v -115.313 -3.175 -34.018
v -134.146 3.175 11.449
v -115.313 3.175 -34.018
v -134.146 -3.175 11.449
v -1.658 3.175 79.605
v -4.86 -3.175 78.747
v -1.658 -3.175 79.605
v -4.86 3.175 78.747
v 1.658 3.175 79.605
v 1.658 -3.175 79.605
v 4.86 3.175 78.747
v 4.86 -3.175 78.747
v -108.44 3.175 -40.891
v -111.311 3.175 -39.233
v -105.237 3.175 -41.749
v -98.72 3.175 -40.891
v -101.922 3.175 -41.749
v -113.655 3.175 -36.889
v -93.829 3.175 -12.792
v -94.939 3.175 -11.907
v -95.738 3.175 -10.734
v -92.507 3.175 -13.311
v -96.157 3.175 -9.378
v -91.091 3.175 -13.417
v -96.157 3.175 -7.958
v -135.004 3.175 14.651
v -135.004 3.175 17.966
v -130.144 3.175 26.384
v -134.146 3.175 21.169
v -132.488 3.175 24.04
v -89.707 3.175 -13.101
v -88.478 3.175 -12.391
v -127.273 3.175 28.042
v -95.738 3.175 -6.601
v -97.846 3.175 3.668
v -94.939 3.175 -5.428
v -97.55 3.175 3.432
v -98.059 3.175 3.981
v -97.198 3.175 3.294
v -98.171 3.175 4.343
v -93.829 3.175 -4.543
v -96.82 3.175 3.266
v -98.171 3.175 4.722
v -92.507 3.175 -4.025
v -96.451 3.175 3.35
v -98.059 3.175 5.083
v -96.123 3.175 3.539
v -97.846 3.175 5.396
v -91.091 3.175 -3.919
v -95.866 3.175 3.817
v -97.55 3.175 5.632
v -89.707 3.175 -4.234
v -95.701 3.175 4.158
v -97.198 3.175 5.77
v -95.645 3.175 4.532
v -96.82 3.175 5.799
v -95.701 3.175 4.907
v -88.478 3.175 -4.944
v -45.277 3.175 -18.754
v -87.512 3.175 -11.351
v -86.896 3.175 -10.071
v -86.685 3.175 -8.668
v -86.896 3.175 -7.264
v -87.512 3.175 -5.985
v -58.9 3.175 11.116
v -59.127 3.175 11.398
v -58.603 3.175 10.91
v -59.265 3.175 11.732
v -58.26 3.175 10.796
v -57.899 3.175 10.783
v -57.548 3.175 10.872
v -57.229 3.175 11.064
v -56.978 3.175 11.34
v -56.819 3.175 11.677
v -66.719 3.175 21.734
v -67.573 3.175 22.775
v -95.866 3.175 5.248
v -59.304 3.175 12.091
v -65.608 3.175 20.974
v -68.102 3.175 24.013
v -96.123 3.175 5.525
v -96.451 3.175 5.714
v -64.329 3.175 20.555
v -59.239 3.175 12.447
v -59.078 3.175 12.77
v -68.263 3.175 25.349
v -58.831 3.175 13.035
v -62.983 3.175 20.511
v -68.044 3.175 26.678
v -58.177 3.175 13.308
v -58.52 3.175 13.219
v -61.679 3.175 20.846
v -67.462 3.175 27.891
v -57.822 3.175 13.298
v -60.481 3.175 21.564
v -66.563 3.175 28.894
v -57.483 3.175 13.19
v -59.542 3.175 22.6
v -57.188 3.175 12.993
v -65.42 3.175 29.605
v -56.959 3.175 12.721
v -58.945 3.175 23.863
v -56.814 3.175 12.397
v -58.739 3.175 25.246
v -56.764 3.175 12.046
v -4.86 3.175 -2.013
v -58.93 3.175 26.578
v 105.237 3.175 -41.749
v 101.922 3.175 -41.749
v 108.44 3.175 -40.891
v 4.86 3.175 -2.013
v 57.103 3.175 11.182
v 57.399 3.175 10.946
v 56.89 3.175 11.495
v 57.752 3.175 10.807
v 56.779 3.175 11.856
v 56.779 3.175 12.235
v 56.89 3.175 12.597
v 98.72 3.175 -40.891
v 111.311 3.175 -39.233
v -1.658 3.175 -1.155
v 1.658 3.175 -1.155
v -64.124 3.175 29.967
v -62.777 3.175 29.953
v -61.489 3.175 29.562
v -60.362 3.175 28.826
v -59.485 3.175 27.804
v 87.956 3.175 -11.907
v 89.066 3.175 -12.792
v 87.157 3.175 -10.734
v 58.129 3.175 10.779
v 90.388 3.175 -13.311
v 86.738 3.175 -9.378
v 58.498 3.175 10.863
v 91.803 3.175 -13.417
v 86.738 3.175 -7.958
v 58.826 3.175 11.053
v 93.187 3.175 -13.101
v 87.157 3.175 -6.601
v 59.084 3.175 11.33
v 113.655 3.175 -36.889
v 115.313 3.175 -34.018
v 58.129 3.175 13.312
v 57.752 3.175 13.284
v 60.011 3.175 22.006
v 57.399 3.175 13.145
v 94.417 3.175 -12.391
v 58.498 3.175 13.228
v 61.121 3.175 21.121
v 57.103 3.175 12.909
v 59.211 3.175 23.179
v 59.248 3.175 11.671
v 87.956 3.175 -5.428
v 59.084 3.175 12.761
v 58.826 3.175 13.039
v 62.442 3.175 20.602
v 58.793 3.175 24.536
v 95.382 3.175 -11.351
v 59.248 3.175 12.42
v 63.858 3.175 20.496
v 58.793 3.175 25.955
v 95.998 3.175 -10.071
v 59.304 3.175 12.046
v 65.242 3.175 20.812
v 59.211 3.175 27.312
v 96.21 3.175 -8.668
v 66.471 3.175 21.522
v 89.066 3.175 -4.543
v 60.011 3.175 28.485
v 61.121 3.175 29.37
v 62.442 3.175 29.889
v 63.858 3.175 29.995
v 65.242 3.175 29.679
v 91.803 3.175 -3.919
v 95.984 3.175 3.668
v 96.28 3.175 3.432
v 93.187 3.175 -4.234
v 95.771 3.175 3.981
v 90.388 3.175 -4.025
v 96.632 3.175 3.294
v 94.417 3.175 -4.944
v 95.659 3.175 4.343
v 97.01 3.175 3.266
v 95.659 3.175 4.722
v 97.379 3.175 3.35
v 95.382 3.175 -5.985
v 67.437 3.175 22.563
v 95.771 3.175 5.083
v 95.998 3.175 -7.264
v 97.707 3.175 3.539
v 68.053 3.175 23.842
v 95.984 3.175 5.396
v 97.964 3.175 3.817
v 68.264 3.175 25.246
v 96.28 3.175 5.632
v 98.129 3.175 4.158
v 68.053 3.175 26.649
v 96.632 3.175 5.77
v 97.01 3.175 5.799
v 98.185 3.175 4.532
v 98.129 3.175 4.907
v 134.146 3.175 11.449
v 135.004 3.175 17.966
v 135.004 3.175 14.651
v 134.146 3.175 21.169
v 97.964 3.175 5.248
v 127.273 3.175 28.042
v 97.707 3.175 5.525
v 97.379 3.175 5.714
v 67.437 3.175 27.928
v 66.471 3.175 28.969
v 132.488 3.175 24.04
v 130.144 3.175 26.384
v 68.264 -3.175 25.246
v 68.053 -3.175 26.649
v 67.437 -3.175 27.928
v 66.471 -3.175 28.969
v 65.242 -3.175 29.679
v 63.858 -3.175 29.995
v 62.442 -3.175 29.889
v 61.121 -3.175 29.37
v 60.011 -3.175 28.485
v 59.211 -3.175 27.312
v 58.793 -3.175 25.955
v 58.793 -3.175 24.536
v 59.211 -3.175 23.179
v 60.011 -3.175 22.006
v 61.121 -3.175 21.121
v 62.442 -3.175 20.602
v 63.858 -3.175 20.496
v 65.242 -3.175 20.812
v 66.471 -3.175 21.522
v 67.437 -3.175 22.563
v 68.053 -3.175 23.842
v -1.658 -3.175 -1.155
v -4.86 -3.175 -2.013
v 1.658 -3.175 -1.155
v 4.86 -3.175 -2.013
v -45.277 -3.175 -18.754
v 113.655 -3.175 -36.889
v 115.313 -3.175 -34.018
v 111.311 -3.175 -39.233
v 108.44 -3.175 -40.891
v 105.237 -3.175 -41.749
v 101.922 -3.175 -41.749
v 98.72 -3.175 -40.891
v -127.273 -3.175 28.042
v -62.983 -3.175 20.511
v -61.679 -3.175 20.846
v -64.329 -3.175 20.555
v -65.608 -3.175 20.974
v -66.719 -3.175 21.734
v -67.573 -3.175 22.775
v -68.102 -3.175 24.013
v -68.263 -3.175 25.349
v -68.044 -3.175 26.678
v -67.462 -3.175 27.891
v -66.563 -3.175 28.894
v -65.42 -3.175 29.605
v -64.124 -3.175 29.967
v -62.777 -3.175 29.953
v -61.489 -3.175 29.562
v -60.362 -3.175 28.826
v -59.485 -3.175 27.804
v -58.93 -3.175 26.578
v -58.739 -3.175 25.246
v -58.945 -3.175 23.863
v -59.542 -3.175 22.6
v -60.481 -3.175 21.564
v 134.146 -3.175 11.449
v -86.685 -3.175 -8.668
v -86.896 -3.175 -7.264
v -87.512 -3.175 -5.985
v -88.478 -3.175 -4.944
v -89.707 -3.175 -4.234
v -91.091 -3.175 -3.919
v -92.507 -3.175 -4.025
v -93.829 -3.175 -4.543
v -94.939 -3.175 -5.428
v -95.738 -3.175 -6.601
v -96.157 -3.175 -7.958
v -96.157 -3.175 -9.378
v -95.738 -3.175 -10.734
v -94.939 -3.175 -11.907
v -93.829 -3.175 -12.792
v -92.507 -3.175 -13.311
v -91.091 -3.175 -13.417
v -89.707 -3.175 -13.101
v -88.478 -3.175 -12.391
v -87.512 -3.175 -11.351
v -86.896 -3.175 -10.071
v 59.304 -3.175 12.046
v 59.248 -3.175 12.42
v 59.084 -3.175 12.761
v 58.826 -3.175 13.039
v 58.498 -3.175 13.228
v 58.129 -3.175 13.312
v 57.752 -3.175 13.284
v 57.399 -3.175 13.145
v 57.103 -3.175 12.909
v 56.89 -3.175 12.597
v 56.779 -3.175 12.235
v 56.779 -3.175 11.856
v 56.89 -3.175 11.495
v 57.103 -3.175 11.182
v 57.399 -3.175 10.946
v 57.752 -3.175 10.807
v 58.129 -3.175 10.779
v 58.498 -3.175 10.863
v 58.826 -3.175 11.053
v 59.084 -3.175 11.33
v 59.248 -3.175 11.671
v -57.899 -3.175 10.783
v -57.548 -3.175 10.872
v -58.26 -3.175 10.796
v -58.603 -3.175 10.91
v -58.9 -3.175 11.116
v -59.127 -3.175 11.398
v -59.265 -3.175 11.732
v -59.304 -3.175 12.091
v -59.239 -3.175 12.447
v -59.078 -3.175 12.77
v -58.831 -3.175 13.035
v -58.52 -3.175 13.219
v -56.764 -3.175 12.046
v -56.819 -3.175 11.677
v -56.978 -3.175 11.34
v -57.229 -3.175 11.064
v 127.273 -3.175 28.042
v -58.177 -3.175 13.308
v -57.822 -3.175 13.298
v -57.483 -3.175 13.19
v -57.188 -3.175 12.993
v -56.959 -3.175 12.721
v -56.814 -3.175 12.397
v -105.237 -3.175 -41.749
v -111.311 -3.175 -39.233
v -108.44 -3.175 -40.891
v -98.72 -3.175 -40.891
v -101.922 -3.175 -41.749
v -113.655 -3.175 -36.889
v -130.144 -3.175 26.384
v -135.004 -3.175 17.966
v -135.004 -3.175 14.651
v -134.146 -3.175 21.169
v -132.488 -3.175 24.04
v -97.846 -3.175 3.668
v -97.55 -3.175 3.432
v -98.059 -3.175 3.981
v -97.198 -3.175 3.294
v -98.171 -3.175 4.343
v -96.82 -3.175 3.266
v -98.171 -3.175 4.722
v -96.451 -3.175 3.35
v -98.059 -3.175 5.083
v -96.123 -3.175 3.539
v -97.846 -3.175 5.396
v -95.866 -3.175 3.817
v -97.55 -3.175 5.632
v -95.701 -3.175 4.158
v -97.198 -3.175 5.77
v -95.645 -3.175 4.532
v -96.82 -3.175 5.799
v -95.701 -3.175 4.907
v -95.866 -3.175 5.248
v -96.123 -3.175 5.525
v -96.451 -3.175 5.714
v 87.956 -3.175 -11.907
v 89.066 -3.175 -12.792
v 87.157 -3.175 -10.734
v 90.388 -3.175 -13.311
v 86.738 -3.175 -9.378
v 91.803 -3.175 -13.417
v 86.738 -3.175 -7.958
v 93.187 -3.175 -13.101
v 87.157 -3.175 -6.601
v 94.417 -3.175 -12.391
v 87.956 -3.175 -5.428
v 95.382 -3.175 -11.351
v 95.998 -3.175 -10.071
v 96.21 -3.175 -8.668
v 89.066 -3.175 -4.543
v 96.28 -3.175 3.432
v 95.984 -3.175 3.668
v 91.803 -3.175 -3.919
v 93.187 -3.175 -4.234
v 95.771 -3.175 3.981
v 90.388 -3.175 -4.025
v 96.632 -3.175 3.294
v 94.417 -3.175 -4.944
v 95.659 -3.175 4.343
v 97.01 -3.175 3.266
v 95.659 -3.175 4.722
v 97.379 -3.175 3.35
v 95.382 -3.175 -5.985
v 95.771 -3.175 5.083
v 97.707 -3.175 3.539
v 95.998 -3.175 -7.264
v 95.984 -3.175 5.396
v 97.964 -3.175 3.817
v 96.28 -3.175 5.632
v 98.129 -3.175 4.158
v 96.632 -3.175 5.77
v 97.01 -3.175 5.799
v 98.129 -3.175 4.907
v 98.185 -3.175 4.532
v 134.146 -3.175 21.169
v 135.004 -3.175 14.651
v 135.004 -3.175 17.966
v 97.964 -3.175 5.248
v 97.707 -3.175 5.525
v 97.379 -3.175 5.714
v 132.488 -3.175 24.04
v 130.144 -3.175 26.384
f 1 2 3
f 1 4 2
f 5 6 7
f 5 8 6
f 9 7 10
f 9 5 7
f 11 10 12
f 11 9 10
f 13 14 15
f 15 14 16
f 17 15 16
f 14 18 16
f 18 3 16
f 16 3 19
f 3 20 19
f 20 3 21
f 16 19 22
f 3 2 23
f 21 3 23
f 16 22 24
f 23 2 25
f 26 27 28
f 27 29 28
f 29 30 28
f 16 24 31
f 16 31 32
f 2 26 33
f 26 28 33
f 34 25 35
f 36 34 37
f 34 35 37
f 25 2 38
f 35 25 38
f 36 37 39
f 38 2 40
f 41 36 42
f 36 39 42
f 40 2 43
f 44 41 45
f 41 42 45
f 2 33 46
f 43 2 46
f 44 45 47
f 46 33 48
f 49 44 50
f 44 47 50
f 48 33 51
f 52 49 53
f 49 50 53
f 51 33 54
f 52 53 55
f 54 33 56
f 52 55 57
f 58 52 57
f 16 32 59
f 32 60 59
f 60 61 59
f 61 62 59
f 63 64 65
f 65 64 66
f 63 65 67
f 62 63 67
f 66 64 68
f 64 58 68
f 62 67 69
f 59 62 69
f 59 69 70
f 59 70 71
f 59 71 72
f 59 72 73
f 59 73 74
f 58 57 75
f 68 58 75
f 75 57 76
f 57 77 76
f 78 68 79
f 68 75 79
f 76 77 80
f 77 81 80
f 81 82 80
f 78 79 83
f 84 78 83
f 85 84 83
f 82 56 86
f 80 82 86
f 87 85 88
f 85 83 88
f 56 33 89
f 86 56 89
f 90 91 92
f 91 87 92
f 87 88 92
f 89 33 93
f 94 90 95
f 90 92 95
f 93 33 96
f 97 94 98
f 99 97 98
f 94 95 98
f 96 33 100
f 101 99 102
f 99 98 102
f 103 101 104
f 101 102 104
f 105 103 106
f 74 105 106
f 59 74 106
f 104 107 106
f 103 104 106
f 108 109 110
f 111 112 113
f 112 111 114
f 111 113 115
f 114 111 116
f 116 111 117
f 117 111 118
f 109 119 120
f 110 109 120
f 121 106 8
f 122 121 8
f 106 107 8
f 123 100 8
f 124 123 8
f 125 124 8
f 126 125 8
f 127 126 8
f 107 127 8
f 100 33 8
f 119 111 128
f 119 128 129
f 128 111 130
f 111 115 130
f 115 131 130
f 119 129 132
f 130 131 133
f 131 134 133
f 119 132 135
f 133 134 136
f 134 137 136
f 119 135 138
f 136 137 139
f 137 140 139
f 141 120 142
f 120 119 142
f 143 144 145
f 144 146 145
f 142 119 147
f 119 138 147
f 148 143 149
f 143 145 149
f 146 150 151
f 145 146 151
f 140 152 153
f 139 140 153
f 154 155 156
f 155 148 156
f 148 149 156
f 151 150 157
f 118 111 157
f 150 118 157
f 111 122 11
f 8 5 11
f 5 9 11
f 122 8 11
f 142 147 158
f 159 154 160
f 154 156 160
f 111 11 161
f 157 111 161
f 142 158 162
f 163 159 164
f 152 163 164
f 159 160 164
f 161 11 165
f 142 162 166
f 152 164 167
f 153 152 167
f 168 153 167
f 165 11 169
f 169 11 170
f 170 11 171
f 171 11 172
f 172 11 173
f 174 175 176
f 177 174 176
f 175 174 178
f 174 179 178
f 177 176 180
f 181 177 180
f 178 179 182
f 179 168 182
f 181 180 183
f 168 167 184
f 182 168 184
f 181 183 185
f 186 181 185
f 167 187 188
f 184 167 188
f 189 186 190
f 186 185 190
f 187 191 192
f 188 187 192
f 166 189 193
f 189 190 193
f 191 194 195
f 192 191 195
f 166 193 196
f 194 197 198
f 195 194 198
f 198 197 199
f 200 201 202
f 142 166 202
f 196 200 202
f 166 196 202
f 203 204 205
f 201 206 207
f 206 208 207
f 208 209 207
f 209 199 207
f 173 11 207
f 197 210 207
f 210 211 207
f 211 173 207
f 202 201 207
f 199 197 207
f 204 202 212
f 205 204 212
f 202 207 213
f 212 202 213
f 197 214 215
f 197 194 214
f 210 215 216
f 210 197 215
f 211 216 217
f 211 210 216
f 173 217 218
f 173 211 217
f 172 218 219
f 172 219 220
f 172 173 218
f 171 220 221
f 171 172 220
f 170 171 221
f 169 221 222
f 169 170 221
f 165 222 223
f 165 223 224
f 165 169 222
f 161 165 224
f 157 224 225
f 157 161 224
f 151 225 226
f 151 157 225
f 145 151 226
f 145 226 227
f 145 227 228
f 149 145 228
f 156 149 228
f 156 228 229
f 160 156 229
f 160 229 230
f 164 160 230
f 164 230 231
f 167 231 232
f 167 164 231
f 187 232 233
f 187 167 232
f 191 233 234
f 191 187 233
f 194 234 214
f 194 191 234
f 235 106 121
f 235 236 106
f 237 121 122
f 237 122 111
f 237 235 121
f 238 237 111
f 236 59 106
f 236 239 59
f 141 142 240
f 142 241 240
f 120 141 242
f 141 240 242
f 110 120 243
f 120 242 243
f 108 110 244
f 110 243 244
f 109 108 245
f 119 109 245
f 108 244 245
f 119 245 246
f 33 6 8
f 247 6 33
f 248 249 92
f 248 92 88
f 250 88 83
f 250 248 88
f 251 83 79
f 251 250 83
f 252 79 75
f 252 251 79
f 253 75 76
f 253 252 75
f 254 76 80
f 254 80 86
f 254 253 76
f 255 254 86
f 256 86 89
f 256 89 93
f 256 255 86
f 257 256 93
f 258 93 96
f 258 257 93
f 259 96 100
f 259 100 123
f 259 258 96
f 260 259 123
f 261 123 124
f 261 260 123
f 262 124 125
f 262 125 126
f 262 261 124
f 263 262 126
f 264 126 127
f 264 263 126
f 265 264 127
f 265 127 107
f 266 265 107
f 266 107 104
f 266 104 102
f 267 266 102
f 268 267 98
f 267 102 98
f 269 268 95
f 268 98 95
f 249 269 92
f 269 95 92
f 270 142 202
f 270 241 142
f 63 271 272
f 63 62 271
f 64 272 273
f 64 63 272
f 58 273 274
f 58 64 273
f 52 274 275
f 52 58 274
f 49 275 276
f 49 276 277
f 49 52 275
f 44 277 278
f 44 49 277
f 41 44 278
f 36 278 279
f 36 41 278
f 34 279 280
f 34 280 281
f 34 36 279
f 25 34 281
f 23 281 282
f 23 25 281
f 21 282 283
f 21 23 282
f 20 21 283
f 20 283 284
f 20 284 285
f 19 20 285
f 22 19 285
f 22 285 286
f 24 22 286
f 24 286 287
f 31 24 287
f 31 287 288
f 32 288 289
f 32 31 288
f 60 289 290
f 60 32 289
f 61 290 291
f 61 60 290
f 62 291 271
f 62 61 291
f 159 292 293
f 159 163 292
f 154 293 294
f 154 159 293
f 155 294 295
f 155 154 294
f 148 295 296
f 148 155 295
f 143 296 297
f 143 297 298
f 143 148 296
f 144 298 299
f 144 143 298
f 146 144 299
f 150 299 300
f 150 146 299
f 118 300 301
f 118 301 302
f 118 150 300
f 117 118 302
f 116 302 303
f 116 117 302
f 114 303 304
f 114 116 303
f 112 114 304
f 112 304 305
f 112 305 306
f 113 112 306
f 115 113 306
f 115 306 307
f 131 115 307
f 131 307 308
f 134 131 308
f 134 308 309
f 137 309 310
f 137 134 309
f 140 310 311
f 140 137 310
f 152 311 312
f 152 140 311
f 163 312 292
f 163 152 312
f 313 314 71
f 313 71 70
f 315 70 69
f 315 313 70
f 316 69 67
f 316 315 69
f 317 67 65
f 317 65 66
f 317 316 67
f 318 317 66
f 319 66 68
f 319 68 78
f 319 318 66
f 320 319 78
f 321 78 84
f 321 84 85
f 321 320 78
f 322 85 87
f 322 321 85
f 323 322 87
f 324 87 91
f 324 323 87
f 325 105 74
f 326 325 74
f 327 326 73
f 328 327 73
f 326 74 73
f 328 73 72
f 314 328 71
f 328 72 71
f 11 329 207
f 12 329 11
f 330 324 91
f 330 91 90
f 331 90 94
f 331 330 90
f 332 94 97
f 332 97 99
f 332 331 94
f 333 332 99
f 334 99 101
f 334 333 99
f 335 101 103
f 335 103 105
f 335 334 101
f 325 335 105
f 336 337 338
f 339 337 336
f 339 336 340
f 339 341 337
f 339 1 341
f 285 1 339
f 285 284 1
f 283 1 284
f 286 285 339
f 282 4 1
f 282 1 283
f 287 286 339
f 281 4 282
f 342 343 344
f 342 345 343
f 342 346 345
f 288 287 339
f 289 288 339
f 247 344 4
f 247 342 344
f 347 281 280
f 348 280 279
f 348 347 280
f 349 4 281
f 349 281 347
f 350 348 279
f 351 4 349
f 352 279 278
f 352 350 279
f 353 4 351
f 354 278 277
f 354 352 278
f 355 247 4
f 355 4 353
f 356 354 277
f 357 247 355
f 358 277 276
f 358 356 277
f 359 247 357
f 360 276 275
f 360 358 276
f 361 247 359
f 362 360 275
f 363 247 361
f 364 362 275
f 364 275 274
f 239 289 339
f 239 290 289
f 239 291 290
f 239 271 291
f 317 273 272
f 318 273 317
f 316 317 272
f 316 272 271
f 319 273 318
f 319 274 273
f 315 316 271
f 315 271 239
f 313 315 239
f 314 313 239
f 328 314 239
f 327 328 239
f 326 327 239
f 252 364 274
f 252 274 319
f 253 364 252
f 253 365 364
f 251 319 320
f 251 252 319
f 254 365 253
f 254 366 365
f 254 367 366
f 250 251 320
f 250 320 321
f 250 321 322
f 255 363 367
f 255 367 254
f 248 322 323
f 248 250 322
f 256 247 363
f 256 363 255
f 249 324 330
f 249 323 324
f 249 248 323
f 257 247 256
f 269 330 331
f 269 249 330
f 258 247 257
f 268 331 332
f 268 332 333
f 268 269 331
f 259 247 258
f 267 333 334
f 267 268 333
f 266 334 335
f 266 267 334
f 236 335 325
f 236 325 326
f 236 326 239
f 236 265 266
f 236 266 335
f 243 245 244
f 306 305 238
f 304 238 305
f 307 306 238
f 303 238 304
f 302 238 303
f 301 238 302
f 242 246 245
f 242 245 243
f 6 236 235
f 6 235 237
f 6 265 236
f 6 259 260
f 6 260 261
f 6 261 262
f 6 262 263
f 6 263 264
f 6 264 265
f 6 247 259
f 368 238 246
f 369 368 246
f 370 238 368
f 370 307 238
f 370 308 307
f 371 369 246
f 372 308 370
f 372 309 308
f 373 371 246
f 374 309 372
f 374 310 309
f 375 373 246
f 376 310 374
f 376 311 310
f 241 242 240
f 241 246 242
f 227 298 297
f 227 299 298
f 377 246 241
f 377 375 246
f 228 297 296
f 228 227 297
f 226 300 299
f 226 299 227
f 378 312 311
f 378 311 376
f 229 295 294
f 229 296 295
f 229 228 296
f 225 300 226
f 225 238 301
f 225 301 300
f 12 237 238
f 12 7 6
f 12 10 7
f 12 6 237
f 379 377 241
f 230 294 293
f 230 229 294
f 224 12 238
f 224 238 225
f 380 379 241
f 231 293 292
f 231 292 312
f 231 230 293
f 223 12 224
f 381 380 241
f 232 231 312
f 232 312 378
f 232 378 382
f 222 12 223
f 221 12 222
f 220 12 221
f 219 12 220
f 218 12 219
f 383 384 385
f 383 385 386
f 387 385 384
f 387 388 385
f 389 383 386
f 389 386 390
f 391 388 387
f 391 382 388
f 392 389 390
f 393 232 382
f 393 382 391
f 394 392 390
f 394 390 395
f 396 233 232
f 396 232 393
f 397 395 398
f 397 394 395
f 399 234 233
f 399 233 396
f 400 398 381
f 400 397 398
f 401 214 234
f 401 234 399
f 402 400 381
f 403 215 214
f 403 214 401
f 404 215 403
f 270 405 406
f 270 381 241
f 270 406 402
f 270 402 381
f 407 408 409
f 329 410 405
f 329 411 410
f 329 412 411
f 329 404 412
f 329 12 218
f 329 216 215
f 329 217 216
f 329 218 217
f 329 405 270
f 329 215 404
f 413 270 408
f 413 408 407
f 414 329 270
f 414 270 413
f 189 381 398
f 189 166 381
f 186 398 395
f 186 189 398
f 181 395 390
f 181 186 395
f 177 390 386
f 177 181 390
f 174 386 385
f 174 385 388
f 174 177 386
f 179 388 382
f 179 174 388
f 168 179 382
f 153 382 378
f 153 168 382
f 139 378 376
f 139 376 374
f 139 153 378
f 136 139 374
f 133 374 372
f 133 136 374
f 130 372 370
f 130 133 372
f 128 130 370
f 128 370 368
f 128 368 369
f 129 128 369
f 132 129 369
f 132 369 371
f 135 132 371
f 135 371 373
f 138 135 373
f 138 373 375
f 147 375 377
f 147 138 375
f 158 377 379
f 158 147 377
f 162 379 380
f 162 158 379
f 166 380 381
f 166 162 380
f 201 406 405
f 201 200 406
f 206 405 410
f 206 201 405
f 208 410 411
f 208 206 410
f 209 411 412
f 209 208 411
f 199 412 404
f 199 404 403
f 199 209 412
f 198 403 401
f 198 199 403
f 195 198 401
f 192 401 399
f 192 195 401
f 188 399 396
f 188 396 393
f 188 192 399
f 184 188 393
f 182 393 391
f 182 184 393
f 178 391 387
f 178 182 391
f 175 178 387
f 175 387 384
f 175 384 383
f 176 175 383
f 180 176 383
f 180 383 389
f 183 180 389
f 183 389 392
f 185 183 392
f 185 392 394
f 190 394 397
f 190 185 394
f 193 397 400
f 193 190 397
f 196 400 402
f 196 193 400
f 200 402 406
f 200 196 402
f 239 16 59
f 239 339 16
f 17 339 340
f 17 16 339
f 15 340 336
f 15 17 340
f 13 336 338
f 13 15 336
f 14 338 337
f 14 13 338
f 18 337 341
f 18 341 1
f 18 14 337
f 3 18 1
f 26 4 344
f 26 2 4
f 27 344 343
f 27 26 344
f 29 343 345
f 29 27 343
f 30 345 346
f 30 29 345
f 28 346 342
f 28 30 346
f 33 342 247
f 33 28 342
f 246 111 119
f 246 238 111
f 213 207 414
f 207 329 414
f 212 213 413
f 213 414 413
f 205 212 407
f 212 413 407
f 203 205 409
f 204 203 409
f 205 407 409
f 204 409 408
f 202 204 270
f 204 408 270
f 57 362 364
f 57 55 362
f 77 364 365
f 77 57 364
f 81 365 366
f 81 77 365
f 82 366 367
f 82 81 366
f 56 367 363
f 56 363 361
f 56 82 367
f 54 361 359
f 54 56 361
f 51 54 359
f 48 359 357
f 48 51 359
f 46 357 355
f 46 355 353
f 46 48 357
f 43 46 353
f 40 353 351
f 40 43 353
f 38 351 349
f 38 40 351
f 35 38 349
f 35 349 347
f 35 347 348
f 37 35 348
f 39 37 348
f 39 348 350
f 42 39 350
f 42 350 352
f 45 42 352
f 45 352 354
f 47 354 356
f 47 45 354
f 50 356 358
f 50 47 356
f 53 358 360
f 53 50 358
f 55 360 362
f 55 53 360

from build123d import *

# Parameters (mm, degrees)
F0_R     = 4.7625
F0_R_2   = 1.27
F1_DEPTH = 3.175
F2_R     = 12.7


with BuildPart() as f1:
    # F0 (on Front) → F1 (new body, symmetric)
    with BuildSketch(Plane.XZ):
        with BuildLine():
            ThreePointArc((-58.739439, 25.245564), (-67.461813, 27.891467), (-61.679409, 20.845588))
            ThreePointArc((-61.679409, 20.845588), (-59.542065, 22.599661), (-58.739439, 25.245564))
        make_face()
        Polygon((-45.276641, -18.754199), (0, 0), (0, 80.759988), (-139.00587, 23.181871), (-110.452903, -45.75109), align=None)
        with Locations((-91.447397, -8.667692)):
            Circle(F0_R, mode=Mode.SUBTRACT)
        with Locations((-96.914986, 4.532236)):
            Circle(F0_R_2, mode=Mode.SUBTRACT)
        with BuildLine():
            ThreePointArc((-56.764349, 12.045635), (-56.978383, 11.340061), (-57.548342, 10.872308))
            ThreePointArc((-57.548342, 10.872308), (-59.207676, 11.559627), (-58.520357, 13.218962))
            ThreePointArc((-58.520357, 13.218962), (-57.328775, 13.101602), (-56.764349, 12.045635))
        make_face(mode=Mode.SUBTRACT)
        with BuildLine():
            ThreePointArc((-58.739439, 25.245564), (-59.542065, 22.599661), (-61.679409, 20.845588))
            ThreePointArc((-61.679409, 20.845588), (-67.461813, 27.891467), (-58.739439, 25.245564))
        make_face(mode=Mode.SUBTRACT)
        Polygon((0, 80.759988), (0, 0), (110.452903, -45.75109), (139.00587, 23.181871), align=None)
        with Locations((58.034349, 12.045635)):
            Circle(F0_R_2, mode=Mode.SUBTRACT)
        with Locations((91.447397, -8.667692)):
            Circle(F0_R, mode=Mode.SUBTRACT)
        with Locations((96.914986, 4.532236)):
            Circle(F0_R_2, mode=Mode.SUBTRACT)
        with Locations((63.501939, 25.245564)):
            Circle(F0_R, mode=Mode.SUBTRACT)
    extrude(amount=F1_DEPTH, both=True)

    # F2
    f2_edges = [f1.edges().sort_by_distance(p)[0] for p in [
        (-139.00587, 0, 23.181871),
        (0, 0, 80.759988),
        (0, 0, 0),
        (110.452903, 0, -45.75109),
        (139.00587, 0, 23.181871),
        (-110.452903, 0, -45.75109),
    ]]
    fillet(f2_edges, radius=F2_R)


solid = f1.part
